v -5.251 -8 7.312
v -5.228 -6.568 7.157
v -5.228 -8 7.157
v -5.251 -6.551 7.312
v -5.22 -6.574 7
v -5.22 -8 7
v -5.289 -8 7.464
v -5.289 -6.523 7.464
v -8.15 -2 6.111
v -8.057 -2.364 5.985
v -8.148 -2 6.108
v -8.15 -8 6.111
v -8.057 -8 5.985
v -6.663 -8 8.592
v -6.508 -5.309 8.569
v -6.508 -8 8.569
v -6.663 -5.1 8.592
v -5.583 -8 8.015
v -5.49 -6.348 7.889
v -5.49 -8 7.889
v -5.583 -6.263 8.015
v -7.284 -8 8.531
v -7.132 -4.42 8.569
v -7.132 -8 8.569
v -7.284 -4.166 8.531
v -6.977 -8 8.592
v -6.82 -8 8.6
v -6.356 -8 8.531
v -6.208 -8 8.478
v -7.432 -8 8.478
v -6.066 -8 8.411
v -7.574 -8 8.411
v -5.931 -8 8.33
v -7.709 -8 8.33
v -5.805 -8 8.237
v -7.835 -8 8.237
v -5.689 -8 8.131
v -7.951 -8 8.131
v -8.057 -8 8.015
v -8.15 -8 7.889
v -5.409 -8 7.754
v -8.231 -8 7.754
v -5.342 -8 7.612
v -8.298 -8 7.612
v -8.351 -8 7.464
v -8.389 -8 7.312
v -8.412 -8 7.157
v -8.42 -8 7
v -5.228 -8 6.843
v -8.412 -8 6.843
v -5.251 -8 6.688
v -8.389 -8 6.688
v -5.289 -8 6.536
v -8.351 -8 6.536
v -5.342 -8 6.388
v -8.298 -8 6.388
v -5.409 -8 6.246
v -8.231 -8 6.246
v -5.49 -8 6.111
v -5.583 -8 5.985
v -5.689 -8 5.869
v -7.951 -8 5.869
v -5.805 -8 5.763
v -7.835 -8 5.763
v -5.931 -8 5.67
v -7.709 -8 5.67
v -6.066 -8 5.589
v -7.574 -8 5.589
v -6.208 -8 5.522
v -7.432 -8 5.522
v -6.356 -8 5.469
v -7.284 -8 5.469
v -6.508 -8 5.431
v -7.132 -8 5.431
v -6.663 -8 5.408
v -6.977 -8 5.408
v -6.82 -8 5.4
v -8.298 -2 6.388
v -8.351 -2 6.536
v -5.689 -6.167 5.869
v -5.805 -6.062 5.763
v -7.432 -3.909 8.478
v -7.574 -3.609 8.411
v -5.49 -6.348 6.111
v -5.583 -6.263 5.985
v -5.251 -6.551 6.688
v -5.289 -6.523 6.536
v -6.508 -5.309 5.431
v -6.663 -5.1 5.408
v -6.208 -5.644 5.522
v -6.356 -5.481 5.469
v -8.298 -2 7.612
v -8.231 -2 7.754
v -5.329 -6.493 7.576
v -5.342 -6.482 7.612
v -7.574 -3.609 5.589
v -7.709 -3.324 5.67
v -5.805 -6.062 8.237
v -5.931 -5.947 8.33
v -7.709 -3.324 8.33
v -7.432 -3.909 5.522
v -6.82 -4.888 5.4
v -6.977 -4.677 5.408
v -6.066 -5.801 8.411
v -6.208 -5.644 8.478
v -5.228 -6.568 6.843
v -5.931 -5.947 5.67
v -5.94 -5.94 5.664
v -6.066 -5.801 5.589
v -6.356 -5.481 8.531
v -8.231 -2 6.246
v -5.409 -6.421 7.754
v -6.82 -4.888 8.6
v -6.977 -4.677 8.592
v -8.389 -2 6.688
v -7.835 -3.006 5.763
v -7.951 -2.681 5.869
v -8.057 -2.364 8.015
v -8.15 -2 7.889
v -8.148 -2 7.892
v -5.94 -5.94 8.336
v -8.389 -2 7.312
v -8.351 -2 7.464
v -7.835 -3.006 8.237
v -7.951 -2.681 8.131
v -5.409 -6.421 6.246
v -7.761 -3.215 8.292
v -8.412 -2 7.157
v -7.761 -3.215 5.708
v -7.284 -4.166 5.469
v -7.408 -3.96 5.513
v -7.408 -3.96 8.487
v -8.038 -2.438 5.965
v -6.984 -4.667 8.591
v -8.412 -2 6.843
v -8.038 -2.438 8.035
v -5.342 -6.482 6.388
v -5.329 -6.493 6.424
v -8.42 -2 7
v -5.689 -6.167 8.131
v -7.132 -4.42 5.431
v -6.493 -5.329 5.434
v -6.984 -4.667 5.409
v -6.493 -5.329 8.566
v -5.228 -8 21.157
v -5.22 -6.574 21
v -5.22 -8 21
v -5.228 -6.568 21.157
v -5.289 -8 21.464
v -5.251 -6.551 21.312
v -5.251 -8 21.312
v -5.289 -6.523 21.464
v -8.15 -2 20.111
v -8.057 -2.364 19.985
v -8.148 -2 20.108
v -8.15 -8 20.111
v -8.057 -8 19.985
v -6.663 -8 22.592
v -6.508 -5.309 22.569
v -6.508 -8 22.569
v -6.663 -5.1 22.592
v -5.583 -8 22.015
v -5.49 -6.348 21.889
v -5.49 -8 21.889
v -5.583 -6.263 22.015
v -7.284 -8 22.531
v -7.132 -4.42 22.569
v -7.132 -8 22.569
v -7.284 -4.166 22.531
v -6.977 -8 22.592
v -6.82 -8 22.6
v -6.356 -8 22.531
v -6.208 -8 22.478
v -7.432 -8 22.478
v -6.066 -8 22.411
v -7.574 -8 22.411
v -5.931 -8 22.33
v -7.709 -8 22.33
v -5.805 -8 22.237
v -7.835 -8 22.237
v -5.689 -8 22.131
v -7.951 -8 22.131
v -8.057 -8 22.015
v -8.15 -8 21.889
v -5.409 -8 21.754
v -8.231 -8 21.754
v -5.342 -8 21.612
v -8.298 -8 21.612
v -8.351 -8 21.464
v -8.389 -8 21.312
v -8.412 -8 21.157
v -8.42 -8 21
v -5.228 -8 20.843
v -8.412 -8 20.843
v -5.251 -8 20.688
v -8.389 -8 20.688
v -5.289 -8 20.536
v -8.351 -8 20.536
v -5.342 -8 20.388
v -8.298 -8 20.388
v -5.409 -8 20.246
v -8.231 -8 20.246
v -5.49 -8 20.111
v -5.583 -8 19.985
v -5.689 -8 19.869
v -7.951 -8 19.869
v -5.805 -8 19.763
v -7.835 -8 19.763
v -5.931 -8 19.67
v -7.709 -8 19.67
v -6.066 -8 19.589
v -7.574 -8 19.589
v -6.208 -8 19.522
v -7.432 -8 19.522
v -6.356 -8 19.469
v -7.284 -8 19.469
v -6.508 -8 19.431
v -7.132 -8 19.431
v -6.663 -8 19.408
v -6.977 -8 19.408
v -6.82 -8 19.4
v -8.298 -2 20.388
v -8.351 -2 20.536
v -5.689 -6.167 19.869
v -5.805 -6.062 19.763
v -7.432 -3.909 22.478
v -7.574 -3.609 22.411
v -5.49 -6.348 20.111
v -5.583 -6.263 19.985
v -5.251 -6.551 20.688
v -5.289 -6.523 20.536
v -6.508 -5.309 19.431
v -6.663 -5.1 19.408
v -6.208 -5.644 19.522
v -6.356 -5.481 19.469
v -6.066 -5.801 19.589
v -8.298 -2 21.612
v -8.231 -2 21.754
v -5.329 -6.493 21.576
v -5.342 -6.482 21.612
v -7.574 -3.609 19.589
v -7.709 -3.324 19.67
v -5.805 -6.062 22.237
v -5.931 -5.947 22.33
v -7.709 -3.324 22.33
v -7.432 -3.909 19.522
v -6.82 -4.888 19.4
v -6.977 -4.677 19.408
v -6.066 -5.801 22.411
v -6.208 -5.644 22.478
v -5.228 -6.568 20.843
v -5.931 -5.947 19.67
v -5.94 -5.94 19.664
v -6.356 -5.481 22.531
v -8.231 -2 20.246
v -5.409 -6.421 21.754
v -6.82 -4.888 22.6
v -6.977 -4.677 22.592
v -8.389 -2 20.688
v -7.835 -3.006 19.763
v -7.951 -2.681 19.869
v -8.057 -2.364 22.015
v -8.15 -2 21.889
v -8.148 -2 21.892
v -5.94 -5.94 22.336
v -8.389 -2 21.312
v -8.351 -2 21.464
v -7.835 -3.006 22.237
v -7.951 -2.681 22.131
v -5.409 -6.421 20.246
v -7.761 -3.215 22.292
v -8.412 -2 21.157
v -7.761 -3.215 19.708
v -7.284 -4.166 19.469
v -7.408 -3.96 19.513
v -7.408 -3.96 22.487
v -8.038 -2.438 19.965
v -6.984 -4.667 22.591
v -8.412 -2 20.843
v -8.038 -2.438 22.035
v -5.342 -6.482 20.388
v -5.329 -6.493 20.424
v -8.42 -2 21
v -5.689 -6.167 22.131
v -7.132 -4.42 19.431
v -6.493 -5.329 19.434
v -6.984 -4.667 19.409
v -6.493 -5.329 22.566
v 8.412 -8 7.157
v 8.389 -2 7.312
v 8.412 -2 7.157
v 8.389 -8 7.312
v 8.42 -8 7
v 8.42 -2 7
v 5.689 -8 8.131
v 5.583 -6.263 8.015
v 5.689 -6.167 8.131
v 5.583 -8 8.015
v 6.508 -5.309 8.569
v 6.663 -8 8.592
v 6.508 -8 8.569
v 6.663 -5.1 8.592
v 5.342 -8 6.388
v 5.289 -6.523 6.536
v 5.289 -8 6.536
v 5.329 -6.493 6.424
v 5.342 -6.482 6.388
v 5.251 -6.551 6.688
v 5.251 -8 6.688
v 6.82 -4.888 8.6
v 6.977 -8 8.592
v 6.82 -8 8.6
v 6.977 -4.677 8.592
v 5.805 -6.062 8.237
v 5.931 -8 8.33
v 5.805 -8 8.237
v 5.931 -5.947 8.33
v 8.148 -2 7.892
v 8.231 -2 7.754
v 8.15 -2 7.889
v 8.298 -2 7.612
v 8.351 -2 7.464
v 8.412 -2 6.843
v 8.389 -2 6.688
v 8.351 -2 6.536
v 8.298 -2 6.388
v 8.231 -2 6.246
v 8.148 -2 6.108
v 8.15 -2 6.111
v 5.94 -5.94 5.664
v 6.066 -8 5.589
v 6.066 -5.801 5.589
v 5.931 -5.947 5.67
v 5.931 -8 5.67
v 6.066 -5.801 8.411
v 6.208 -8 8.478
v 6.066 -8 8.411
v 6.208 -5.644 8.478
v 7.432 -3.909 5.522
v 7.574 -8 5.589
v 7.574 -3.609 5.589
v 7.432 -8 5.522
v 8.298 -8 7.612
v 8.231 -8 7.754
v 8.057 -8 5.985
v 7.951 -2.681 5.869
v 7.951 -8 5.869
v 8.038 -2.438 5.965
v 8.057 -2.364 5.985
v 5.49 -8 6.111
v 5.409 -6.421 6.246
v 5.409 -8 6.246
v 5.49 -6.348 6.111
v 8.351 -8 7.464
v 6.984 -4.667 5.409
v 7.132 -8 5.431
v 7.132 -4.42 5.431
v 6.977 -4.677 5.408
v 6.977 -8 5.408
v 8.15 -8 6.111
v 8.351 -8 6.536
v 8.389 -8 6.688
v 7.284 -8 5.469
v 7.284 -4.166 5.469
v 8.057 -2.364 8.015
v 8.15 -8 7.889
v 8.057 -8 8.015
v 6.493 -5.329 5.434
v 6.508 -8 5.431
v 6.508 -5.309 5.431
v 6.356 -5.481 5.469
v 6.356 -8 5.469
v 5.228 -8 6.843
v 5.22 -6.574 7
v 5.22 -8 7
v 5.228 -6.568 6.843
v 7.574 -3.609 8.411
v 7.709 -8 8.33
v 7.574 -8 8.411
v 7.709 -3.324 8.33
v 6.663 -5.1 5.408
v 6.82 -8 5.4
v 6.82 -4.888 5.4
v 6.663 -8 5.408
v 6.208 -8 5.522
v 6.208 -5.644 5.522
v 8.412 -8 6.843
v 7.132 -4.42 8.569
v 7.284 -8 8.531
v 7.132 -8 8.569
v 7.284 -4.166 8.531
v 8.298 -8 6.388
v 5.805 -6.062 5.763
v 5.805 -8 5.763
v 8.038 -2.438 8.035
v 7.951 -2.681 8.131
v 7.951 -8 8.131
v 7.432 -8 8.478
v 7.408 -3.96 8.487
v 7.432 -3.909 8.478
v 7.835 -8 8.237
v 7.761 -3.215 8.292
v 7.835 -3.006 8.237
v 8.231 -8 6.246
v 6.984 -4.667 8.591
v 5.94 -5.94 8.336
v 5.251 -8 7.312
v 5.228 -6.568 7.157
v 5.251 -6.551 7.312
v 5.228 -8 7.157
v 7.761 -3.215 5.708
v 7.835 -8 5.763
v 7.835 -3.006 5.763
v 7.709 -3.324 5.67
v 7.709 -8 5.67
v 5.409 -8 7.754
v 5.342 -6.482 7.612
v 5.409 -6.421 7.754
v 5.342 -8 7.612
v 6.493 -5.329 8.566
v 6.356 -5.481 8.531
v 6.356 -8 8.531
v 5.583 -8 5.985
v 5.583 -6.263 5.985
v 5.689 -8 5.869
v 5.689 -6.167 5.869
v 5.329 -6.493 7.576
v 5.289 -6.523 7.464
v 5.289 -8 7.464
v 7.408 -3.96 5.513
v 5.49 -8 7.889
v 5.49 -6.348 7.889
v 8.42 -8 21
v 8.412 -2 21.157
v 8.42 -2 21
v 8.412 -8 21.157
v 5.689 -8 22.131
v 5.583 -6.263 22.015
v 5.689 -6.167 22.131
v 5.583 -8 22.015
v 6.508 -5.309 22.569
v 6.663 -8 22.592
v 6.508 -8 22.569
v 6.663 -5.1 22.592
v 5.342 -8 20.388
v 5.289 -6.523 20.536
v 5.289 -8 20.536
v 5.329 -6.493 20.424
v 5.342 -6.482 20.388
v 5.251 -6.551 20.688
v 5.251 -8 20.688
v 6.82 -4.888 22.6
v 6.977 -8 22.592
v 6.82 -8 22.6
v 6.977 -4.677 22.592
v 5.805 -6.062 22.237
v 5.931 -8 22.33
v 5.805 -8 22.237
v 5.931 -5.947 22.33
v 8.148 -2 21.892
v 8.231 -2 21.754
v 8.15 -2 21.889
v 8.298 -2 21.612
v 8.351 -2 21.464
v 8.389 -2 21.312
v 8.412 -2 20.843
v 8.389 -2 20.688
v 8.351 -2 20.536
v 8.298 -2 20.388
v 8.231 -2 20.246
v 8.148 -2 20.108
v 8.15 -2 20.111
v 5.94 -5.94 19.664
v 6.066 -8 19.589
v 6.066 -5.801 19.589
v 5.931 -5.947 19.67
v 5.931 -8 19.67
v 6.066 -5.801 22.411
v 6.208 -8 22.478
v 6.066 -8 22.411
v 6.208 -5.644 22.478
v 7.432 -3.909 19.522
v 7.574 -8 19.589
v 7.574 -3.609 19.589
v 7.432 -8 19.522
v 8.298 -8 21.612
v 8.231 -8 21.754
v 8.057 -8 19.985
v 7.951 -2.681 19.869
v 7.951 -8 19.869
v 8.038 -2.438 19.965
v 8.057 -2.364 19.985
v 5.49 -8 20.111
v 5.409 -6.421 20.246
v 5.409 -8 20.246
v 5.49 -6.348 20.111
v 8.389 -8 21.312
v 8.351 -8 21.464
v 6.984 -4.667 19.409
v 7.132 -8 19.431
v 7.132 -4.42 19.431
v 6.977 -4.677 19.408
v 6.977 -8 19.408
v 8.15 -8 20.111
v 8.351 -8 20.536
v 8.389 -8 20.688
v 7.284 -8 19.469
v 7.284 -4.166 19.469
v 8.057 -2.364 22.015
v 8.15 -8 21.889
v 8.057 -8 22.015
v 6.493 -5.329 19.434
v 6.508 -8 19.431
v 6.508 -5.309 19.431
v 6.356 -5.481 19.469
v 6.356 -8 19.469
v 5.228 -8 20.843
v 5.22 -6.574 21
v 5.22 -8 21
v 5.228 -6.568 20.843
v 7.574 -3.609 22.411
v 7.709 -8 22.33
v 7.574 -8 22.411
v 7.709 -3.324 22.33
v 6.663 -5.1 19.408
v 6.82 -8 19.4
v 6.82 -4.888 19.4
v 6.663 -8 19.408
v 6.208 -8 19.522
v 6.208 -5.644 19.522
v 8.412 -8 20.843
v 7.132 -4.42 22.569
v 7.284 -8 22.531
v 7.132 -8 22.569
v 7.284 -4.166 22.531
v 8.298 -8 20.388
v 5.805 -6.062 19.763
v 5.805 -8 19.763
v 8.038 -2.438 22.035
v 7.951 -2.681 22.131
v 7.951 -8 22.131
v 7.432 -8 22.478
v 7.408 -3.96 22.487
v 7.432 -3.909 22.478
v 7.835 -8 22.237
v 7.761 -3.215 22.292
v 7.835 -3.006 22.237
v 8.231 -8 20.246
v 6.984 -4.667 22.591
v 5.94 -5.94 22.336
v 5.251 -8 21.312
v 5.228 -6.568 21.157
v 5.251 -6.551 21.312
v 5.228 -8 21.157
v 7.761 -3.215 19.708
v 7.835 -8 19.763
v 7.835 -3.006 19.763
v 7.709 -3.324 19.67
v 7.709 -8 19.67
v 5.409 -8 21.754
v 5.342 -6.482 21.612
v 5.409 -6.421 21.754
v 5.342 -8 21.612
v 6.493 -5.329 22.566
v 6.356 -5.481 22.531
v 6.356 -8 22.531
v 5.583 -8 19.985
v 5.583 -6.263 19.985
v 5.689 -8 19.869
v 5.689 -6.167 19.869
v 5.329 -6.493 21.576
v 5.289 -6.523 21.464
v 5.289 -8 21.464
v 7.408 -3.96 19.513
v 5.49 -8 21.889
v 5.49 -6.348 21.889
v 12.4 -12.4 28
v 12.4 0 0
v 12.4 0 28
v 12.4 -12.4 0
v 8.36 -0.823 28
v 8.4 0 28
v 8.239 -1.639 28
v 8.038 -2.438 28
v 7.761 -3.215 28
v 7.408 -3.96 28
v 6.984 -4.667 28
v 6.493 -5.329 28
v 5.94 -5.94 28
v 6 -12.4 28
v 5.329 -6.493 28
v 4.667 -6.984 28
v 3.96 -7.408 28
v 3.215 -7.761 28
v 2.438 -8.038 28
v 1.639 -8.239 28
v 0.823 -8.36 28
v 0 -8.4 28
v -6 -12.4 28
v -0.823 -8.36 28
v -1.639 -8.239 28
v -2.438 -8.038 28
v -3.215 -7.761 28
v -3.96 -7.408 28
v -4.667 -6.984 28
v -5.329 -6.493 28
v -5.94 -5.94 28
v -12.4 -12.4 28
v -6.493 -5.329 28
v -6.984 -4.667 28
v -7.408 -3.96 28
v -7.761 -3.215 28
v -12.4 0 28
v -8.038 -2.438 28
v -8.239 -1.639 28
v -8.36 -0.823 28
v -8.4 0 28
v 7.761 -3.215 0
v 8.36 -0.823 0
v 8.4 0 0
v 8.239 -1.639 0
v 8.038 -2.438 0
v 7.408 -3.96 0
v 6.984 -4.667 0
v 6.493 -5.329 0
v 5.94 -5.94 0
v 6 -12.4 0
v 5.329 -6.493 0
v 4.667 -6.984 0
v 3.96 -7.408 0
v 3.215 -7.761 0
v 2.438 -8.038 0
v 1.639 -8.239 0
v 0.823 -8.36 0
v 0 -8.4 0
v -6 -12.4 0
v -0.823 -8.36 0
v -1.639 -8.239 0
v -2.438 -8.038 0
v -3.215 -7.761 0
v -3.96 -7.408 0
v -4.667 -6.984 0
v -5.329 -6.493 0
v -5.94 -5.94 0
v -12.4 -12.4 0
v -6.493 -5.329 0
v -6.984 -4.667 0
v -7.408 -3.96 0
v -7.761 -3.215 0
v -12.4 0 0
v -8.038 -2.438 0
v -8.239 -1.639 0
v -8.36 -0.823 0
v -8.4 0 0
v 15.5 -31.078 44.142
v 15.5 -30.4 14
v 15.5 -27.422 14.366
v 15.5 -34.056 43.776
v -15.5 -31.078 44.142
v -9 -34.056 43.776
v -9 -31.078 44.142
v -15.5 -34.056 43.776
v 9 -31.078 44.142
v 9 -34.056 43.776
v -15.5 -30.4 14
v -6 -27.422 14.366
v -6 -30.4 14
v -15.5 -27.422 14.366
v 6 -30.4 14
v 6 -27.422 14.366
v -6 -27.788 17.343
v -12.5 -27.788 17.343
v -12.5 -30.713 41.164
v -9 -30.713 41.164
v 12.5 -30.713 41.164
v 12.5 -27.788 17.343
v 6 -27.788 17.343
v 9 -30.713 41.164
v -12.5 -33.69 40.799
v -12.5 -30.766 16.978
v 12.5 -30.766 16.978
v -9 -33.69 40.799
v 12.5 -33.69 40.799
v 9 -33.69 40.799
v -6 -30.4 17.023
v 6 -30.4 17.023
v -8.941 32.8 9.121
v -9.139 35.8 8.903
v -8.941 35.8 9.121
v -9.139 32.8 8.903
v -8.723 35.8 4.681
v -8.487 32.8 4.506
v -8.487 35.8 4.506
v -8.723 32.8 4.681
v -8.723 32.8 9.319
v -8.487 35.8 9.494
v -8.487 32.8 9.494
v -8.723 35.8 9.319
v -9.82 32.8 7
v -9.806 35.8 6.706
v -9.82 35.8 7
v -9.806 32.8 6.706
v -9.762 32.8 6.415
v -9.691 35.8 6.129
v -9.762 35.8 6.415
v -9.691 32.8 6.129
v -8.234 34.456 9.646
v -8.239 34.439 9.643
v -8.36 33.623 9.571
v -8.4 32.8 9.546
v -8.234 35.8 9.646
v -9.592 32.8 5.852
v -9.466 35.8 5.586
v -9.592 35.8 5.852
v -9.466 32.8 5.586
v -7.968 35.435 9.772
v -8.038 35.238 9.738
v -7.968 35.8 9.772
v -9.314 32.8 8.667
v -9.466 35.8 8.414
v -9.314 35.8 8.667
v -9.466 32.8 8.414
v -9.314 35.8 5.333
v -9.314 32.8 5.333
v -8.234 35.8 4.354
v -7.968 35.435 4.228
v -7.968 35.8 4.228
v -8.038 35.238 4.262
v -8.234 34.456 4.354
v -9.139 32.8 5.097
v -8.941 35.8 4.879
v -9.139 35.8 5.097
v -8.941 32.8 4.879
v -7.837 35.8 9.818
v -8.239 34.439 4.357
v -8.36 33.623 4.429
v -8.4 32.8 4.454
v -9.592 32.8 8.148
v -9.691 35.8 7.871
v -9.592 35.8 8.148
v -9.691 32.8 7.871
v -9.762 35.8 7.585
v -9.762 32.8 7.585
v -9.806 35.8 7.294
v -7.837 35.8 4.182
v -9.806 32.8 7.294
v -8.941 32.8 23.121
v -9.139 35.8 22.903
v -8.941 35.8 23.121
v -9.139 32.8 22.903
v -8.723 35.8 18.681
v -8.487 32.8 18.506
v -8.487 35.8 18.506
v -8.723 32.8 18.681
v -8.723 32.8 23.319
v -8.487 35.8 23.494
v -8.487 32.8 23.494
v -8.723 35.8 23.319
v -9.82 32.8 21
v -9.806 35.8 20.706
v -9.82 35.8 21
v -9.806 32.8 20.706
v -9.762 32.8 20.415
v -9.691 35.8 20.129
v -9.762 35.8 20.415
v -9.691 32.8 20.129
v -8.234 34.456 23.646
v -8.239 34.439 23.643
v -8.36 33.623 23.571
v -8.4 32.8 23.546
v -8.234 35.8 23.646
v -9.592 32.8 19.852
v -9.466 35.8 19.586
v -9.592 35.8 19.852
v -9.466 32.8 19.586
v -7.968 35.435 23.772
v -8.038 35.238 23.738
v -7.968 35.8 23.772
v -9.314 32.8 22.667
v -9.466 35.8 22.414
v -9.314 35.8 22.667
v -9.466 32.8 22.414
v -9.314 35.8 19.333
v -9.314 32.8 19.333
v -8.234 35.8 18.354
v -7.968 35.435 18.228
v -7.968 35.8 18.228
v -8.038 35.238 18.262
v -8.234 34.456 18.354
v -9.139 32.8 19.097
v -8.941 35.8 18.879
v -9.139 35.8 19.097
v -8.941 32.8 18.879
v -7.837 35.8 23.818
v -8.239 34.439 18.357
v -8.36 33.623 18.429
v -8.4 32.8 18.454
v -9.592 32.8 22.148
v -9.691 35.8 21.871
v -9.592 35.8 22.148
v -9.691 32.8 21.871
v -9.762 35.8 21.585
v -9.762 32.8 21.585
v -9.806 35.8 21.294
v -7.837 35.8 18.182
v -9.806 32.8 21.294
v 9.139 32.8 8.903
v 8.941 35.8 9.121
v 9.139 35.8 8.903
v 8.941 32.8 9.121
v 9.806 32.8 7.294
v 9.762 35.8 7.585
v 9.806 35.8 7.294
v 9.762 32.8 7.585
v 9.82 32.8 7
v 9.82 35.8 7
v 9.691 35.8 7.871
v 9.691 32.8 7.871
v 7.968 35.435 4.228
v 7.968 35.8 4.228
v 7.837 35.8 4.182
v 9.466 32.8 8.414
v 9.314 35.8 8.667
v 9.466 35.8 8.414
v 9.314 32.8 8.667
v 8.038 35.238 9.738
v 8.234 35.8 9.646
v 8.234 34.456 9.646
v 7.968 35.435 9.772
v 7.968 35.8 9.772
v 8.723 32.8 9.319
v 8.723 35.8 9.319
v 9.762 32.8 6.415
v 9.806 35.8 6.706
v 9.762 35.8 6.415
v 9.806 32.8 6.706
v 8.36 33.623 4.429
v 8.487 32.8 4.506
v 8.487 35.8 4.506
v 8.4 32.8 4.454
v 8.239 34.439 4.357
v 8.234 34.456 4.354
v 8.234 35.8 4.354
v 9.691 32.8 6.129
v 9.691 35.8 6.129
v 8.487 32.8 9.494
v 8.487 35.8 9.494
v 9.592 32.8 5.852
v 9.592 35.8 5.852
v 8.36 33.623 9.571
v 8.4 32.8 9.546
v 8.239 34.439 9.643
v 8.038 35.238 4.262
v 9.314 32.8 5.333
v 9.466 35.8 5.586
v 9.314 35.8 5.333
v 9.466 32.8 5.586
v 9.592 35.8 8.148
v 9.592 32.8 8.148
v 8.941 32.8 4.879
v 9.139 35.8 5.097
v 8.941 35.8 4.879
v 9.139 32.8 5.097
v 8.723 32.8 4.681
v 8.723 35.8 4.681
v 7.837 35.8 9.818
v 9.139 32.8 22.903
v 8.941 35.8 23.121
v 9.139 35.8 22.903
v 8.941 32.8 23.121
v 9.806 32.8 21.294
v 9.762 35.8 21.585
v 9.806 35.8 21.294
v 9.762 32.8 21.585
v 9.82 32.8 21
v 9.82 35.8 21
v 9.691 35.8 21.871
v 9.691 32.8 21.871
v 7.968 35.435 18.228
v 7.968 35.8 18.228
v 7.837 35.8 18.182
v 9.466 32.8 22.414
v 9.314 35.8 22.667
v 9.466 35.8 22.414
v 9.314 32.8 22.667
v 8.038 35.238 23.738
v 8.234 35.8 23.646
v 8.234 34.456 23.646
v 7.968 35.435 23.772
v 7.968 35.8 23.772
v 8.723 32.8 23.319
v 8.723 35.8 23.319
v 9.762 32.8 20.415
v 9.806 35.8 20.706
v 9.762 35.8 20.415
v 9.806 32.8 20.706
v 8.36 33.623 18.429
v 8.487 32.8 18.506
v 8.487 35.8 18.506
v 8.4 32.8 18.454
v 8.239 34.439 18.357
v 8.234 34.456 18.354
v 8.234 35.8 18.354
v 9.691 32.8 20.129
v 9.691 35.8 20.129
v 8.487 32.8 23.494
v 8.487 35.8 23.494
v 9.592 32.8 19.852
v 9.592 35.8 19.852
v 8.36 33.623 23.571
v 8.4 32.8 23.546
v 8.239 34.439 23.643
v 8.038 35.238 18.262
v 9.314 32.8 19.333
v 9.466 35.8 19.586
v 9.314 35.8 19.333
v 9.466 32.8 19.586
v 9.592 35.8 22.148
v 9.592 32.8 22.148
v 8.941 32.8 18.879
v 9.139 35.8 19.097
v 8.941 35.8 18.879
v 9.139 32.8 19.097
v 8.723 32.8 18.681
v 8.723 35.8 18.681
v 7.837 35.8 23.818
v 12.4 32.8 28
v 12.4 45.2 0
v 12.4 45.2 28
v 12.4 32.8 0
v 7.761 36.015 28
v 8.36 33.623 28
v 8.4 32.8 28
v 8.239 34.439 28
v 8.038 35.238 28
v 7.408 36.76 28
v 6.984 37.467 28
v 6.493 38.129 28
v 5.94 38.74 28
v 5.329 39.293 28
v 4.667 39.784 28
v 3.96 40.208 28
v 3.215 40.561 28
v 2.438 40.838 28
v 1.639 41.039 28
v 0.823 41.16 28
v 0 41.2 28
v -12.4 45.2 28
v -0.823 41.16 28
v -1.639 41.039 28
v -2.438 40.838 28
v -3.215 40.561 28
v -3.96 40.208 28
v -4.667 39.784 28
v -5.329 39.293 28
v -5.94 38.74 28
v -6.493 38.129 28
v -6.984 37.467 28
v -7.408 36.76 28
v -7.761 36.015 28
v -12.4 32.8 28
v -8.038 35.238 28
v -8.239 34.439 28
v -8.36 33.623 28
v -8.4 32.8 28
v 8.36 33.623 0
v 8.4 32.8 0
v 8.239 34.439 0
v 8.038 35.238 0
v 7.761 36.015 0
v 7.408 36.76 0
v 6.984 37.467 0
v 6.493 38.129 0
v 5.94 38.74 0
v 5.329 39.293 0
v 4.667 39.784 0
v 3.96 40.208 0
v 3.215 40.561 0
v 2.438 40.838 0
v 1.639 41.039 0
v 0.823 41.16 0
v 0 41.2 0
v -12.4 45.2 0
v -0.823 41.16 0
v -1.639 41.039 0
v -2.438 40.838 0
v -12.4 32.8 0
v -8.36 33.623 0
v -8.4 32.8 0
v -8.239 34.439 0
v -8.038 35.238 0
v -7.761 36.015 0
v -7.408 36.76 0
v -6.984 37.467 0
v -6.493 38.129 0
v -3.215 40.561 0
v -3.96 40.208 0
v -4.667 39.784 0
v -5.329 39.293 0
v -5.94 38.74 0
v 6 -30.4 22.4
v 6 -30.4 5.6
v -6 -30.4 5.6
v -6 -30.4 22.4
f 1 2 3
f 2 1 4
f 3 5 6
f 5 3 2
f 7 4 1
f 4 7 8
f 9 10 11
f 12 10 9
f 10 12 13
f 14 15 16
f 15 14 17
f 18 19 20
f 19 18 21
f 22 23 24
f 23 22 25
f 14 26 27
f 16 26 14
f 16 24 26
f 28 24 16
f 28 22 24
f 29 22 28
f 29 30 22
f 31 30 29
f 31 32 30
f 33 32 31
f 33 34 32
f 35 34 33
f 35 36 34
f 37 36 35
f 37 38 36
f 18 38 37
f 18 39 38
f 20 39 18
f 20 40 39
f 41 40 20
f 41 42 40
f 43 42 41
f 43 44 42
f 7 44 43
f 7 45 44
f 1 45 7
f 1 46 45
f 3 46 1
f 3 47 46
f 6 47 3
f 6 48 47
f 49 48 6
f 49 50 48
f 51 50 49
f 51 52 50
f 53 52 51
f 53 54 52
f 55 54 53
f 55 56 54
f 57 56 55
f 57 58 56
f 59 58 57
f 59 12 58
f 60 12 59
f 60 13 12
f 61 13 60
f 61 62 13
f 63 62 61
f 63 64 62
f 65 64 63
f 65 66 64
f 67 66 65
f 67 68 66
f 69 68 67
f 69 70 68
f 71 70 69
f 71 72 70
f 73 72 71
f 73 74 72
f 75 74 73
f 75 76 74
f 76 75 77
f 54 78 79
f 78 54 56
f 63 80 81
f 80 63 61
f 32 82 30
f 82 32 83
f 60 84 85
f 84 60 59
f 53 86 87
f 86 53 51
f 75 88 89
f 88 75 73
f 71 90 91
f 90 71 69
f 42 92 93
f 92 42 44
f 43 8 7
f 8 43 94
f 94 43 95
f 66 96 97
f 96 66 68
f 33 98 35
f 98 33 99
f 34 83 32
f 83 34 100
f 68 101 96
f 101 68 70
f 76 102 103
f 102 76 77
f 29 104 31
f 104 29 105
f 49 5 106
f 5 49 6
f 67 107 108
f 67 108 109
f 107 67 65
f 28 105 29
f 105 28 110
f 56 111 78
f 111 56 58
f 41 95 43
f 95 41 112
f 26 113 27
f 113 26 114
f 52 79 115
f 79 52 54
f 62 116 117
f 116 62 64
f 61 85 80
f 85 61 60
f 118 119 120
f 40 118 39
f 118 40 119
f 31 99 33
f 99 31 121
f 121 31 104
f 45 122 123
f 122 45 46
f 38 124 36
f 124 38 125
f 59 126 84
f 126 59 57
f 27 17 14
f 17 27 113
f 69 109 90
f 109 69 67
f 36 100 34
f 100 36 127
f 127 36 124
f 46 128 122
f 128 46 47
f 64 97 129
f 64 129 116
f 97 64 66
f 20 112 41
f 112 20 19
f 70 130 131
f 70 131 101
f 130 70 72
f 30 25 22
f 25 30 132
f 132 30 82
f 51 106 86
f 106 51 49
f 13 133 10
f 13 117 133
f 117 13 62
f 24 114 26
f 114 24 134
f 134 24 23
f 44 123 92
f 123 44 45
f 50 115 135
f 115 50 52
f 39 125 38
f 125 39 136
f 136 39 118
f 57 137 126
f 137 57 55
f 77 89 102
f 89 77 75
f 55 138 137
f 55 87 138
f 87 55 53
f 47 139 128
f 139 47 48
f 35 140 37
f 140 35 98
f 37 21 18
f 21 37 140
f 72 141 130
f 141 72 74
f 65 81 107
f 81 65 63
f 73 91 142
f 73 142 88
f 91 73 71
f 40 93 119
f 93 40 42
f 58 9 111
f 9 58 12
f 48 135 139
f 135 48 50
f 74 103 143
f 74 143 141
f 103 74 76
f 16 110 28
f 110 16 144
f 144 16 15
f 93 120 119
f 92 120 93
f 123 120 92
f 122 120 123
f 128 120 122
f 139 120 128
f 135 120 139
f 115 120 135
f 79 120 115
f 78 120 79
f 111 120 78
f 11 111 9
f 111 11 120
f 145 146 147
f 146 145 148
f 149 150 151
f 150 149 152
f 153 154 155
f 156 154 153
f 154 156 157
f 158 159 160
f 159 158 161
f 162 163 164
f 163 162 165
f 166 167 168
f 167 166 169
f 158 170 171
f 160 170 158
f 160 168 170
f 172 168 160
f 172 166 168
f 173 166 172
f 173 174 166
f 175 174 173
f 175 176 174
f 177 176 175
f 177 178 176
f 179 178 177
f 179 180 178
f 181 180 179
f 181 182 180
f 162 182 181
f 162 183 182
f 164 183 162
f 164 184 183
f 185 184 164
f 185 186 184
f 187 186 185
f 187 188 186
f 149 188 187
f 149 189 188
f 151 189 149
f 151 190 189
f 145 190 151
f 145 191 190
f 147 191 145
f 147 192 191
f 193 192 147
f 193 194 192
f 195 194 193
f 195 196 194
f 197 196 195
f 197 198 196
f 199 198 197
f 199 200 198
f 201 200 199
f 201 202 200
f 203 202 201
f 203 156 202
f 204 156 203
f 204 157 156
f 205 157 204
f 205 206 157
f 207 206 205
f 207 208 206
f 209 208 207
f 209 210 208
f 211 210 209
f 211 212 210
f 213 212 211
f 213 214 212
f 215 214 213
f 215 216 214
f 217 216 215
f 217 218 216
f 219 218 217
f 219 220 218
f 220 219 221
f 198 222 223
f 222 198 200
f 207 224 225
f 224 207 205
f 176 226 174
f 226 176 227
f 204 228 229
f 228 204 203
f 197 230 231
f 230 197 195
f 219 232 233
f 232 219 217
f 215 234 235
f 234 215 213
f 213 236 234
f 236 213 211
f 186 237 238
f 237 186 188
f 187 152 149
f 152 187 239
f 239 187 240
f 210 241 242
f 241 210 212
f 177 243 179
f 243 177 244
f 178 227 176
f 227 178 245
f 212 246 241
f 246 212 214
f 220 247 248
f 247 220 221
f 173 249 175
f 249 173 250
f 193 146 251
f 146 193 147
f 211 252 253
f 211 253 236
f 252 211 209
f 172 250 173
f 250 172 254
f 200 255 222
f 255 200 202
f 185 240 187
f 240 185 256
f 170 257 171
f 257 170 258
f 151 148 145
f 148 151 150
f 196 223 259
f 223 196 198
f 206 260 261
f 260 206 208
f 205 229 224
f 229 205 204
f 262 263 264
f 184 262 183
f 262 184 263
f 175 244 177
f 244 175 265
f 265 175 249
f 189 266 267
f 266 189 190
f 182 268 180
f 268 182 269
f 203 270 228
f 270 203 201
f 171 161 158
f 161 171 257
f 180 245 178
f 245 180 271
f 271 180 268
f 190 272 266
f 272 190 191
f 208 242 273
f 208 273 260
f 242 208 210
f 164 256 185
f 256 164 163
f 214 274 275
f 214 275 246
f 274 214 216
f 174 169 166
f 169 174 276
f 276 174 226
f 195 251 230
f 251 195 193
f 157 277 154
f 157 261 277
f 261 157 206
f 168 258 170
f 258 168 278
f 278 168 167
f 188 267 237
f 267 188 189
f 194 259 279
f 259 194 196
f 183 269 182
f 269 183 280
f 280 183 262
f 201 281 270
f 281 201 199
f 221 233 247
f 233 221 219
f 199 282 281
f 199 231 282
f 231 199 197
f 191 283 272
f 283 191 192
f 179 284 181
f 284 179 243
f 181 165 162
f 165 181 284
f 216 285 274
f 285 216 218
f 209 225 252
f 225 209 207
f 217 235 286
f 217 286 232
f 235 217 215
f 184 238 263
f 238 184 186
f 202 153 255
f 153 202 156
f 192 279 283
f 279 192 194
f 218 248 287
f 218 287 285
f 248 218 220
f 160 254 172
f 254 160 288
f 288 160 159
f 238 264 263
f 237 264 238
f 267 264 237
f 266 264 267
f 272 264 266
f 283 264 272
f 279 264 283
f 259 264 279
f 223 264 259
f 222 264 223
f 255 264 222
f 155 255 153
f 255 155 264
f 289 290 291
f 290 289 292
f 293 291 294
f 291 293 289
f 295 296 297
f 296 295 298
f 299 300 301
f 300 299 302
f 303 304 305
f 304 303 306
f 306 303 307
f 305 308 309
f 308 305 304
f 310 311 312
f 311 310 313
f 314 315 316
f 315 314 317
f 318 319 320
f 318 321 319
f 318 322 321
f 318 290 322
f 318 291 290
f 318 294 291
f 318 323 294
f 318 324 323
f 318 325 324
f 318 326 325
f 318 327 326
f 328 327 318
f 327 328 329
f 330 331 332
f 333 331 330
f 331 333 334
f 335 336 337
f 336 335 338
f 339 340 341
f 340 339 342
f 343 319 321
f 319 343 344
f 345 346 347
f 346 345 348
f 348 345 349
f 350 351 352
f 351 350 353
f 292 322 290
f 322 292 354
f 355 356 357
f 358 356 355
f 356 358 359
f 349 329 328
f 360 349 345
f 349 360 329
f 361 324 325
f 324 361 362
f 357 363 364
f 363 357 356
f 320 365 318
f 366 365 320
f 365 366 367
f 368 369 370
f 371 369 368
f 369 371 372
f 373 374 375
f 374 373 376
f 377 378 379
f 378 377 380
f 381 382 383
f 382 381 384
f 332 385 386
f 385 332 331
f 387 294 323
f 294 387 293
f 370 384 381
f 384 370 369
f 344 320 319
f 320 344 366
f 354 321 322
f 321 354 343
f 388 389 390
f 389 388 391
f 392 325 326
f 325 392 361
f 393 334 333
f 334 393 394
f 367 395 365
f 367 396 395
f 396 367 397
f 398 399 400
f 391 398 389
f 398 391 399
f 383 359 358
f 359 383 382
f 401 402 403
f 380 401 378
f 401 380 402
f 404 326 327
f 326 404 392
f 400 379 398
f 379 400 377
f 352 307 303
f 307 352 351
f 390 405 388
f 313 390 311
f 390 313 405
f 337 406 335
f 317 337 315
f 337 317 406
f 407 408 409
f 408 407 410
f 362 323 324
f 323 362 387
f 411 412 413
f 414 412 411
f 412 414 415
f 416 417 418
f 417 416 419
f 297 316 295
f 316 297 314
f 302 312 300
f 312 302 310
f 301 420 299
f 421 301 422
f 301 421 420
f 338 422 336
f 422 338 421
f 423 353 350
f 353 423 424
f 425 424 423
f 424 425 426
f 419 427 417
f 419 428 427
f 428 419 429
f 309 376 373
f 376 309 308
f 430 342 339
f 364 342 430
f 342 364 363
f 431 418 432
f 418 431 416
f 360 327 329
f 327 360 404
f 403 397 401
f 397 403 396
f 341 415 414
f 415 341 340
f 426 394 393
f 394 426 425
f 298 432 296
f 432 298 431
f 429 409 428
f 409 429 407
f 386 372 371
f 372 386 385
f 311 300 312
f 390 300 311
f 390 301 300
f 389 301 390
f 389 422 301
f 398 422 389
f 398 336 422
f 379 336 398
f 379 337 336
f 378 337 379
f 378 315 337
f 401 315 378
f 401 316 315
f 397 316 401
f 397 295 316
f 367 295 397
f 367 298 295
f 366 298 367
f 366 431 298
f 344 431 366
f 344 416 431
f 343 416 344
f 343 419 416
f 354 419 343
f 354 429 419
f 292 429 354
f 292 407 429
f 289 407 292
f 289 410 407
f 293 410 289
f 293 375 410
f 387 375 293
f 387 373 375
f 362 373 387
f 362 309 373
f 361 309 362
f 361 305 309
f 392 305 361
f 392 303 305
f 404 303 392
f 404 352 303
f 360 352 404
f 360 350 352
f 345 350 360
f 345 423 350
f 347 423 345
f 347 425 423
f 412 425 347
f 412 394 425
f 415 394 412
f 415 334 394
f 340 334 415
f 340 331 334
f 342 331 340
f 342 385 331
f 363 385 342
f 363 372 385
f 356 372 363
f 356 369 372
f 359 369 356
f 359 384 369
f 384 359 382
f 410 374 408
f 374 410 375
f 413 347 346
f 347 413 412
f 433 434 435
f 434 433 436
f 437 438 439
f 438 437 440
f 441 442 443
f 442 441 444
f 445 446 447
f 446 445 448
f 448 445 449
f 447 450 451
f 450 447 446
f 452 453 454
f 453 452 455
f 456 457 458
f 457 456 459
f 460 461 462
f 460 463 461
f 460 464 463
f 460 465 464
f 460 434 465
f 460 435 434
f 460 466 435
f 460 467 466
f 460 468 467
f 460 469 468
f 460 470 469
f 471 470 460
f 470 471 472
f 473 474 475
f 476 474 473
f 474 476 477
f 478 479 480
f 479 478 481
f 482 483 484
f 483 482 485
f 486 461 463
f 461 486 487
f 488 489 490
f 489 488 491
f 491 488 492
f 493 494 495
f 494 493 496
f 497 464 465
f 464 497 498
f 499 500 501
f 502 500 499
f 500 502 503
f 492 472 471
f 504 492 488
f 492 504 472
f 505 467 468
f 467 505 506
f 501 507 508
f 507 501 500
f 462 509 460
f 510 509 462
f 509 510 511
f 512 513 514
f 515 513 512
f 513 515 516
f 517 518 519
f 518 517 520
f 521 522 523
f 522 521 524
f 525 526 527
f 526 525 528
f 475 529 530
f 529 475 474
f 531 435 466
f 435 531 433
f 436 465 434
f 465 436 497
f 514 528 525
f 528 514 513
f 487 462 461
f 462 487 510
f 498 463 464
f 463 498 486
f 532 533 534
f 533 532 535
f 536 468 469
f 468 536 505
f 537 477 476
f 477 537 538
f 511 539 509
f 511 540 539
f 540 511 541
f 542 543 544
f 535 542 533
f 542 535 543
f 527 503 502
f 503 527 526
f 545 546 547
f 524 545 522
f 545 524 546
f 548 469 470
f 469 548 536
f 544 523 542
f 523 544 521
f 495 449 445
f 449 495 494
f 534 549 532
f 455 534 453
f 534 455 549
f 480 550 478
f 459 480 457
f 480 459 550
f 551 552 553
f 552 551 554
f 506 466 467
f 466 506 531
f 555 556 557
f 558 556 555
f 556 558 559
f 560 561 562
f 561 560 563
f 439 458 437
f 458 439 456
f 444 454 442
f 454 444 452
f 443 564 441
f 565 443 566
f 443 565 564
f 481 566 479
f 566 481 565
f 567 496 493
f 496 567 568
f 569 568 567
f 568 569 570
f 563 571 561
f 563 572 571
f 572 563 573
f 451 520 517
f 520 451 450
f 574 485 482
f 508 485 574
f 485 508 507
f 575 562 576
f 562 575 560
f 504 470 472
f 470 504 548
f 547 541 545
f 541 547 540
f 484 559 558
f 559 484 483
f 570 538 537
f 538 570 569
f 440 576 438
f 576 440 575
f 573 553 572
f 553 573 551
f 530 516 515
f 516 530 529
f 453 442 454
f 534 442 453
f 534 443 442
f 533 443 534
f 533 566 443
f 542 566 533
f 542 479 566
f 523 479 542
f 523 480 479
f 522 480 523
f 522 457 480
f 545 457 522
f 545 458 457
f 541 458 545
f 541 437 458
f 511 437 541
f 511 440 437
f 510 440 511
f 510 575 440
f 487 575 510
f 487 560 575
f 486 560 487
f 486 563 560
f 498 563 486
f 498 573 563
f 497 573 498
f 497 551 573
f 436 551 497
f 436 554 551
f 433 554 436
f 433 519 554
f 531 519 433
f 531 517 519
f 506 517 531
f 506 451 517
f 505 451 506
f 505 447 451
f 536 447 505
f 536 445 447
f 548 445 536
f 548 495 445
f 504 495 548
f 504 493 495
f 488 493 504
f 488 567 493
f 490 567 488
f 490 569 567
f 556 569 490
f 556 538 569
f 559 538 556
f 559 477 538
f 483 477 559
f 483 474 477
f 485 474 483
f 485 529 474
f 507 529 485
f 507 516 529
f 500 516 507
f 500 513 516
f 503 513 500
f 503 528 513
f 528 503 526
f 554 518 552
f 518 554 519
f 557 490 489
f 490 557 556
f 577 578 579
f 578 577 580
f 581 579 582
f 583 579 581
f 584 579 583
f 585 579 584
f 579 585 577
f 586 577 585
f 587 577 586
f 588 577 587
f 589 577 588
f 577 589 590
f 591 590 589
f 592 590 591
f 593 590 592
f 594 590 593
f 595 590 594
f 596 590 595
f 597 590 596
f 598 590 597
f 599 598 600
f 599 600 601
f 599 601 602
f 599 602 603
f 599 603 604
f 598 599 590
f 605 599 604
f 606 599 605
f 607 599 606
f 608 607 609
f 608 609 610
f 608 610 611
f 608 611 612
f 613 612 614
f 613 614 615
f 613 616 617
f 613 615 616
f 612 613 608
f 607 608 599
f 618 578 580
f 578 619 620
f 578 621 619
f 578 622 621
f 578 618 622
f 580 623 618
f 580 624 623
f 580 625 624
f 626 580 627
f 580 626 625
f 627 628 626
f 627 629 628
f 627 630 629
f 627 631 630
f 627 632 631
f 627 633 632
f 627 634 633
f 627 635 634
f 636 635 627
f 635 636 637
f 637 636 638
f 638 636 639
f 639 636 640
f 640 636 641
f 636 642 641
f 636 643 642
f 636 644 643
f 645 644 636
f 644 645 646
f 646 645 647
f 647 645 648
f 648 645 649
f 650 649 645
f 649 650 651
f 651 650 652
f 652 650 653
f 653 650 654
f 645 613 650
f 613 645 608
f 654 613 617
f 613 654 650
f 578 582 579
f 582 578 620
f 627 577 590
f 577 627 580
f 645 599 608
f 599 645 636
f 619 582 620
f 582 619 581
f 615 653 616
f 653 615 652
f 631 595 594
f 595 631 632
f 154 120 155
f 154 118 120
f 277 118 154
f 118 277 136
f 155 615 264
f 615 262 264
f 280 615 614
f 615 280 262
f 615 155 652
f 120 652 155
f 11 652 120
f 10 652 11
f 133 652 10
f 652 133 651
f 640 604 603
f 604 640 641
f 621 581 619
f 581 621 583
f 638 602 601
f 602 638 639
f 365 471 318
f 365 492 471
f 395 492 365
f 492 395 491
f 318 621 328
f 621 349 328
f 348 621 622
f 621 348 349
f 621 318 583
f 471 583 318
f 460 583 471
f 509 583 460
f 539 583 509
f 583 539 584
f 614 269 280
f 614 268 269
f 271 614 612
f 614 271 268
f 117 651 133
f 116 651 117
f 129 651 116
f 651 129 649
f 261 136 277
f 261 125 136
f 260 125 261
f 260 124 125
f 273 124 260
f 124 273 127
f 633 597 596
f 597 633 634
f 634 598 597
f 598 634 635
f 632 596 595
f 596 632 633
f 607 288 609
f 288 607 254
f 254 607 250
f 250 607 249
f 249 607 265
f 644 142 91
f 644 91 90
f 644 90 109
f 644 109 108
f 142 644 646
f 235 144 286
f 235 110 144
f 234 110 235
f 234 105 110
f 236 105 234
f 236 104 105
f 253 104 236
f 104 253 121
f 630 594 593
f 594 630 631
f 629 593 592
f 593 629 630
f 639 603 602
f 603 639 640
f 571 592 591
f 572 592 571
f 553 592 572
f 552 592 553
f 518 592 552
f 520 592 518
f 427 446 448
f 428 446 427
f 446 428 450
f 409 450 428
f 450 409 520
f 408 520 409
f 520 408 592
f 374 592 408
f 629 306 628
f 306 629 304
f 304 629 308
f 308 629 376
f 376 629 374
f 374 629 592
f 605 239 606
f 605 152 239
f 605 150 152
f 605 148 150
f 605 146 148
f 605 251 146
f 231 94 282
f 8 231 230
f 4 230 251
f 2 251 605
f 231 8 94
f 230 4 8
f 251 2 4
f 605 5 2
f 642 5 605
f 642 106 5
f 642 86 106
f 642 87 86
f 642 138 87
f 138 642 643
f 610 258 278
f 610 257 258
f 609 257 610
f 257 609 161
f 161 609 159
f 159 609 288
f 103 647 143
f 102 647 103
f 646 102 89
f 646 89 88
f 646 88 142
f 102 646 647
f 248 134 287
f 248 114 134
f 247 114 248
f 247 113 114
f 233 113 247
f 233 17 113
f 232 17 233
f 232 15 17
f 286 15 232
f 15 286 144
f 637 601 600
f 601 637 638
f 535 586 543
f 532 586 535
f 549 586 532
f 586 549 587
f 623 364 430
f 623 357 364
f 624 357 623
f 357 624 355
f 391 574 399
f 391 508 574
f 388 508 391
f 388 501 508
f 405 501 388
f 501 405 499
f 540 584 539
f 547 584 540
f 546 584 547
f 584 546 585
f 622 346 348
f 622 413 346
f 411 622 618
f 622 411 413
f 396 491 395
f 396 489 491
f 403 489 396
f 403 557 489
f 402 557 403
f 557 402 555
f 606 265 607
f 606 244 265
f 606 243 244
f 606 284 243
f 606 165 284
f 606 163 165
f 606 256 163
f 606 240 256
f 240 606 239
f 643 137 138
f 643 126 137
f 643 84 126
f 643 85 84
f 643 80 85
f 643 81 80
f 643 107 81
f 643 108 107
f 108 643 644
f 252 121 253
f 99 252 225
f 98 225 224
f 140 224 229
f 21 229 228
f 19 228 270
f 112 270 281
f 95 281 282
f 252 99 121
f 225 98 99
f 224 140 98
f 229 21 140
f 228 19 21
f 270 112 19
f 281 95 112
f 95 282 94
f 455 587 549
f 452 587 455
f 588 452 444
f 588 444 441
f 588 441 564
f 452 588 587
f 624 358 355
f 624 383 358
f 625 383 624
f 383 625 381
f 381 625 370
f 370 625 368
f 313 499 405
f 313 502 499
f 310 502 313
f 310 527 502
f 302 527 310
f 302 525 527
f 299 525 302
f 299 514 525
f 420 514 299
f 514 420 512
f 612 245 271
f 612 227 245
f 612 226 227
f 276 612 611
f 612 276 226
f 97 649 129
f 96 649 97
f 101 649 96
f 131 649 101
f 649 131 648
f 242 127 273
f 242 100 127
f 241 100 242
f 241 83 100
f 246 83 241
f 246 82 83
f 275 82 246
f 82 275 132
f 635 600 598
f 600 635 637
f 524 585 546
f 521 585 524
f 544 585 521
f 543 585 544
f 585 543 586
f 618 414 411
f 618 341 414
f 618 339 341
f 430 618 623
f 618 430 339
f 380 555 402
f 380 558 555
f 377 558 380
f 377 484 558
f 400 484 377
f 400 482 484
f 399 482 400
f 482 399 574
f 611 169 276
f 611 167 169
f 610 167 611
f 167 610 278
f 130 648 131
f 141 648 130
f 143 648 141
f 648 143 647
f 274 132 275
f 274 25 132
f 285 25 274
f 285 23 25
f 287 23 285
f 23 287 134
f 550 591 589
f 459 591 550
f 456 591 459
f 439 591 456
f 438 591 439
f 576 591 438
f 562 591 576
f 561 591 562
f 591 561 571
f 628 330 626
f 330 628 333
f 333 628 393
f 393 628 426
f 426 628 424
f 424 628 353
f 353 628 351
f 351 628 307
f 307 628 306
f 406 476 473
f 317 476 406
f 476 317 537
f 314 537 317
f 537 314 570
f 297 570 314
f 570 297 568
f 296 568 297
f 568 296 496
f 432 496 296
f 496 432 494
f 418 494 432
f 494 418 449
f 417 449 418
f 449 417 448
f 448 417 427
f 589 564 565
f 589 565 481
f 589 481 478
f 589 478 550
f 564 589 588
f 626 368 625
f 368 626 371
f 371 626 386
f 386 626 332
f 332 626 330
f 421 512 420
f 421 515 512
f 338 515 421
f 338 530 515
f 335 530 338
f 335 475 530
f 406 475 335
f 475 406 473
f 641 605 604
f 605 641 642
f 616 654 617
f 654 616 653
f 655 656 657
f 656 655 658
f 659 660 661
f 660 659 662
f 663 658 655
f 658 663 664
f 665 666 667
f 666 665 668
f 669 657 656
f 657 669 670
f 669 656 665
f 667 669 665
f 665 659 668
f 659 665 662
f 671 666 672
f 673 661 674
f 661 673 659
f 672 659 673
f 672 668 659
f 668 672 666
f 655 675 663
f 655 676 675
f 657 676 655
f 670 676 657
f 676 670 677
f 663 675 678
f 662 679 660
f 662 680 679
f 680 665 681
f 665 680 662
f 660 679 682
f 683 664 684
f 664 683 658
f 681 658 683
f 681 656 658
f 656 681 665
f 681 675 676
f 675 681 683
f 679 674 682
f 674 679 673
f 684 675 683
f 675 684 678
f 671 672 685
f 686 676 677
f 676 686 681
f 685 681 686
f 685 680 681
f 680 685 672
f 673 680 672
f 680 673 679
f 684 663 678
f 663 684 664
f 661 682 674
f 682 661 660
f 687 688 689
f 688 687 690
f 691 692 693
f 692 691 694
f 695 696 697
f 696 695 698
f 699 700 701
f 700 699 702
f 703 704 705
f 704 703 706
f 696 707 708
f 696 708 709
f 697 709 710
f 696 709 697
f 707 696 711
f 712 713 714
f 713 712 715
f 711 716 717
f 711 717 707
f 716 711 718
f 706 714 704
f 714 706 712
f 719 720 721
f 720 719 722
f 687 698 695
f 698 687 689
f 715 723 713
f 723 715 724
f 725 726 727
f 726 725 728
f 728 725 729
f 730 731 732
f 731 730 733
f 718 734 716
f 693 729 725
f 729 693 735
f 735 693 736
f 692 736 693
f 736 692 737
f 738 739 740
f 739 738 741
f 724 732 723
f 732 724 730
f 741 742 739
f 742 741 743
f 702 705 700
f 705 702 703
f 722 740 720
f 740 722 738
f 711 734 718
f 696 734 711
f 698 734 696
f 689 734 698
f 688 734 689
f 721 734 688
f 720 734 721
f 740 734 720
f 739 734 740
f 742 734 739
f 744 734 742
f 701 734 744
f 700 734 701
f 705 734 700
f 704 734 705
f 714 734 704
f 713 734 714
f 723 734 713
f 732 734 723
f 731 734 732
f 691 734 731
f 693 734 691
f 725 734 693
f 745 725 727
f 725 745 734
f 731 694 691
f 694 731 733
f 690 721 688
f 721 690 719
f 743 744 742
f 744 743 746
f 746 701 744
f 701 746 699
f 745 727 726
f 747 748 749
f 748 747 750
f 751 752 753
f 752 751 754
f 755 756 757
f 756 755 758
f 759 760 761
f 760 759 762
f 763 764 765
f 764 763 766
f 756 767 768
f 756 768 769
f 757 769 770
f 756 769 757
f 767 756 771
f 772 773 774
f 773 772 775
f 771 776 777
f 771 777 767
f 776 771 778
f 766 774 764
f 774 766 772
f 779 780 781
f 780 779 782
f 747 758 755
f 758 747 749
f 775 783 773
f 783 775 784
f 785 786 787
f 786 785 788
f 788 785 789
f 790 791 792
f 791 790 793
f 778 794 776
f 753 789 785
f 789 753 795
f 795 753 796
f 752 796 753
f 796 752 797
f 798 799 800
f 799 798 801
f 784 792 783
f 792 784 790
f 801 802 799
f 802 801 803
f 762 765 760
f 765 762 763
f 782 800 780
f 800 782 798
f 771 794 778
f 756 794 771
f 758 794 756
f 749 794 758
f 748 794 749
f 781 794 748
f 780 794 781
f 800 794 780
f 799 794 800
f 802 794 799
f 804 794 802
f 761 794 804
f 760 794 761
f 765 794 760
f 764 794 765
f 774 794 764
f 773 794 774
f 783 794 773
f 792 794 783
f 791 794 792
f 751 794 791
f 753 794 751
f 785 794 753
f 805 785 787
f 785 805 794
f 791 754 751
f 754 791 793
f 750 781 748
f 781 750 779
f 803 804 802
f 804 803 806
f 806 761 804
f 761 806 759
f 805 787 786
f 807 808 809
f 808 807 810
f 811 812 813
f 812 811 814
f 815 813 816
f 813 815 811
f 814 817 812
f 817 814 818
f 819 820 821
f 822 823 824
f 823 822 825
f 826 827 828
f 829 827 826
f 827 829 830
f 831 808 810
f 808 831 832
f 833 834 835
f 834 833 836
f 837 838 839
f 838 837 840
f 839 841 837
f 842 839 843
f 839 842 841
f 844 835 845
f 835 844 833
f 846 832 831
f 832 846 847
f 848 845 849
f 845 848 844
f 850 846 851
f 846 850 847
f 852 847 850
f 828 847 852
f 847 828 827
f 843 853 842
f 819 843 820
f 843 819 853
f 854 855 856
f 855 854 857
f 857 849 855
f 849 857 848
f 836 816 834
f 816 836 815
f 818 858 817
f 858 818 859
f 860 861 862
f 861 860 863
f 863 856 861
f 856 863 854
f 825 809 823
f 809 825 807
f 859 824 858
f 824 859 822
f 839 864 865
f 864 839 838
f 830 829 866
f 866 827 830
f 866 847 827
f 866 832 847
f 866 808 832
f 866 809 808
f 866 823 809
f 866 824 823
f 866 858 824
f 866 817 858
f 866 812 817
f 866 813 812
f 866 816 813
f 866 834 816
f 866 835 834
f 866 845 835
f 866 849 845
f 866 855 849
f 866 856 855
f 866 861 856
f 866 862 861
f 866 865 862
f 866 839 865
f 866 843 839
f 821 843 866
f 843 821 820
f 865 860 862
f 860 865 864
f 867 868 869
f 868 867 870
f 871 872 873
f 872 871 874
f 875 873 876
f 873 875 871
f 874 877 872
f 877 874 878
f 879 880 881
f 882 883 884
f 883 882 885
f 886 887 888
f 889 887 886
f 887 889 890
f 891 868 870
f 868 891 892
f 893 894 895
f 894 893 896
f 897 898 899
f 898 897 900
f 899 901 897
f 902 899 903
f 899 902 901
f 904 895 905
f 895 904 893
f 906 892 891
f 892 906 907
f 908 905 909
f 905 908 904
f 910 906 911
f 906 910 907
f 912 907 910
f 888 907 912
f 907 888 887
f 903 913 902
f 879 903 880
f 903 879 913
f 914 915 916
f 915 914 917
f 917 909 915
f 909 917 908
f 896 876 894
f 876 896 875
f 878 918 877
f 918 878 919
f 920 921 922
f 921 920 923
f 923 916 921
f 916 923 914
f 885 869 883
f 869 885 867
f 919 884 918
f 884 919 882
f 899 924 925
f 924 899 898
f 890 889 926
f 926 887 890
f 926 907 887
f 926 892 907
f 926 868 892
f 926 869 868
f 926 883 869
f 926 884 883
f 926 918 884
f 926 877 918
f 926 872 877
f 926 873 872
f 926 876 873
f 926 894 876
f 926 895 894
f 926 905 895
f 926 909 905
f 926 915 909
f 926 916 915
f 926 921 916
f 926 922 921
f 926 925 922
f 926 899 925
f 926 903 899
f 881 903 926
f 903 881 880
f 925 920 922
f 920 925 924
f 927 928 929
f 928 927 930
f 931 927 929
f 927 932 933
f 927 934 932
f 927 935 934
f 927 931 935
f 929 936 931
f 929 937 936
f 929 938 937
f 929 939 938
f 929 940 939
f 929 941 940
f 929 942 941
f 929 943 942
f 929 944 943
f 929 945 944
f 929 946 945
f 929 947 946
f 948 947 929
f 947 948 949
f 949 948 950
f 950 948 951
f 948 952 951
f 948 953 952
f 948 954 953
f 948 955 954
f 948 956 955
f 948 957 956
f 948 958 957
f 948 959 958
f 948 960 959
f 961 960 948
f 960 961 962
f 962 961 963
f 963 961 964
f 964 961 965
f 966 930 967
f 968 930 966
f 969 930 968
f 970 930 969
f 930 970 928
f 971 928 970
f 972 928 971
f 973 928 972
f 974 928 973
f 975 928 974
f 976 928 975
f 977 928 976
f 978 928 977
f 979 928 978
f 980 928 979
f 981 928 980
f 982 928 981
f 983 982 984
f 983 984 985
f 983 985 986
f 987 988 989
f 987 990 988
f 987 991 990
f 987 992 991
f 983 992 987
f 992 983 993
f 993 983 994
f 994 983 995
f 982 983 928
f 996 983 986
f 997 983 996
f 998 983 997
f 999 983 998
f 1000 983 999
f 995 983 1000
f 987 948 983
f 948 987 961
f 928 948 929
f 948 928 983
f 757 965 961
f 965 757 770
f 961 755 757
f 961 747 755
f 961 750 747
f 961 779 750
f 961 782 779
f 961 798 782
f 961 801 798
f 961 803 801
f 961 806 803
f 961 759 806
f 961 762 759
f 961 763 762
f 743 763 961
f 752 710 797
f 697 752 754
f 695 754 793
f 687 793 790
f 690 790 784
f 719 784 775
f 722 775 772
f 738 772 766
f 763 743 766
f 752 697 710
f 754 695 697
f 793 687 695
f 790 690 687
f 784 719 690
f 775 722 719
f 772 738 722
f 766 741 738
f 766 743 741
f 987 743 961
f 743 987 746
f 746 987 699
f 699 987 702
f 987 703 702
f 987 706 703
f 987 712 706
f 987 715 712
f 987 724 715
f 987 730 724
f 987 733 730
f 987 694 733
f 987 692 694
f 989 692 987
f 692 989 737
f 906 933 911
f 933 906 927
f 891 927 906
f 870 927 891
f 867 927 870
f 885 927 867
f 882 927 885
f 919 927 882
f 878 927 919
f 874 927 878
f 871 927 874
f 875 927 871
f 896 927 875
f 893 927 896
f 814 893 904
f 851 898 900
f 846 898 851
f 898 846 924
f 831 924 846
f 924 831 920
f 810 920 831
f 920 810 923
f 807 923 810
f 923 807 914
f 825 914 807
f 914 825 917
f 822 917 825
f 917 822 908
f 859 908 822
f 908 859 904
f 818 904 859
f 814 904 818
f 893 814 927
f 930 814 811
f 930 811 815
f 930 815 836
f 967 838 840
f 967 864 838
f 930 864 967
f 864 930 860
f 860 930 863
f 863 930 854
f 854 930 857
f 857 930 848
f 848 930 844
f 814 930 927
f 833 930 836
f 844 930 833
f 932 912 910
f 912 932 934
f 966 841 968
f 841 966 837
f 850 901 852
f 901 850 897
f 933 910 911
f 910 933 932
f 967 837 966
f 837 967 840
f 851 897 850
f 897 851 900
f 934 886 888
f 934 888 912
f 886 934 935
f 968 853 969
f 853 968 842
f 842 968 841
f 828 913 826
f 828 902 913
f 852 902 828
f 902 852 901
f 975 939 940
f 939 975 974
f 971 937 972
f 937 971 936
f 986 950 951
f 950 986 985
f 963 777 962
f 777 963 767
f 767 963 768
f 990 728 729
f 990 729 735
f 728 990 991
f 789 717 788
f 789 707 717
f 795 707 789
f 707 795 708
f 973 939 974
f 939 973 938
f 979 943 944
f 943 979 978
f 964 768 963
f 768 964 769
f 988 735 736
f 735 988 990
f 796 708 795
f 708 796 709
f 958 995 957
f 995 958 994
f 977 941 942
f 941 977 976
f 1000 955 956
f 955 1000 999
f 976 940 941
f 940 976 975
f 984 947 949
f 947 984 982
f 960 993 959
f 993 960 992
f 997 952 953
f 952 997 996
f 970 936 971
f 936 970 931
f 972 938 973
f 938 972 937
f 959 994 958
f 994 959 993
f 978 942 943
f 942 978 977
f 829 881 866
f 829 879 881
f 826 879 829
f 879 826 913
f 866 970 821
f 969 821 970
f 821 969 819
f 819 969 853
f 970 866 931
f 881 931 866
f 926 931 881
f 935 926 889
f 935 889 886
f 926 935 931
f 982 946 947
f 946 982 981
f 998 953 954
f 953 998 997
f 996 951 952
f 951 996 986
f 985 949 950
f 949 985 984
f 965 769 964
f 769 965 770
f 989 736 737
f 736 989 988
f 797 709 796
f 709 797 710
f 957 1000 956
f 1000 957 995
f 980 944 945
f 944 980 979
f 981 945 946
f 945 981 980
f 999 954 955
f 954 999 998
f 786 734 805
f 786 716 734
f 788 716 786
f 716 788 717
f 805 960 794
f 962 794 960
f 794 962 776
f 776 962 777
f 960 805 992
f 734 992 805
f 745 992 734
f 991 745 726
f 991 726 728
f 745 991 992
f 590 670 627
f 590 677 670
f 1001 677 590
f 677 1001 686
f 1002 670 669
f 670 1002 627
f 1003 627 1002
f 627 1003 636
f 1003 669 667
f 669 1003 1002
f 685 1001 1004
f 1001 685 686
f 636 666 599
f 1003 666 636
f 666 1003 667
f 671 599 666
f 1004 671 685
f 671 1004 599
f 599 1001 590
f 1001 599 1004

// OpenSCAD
// ============================================================
//  THE AVIATOR — Forward Camera Mount
//  Clamps to Tarot FY690S front arm (16mm OD tube)
//  Pi Camera v2 faces forward at 7 degrees downward tilt
//  Print in PETG, 60% infill, 0.2mm layer height
// ============================================================

ARM_OD        = 16.0;
ARM_CLAMP_GAP = 0.4;
CLAMP_W       = 28;
CLAMP_WALL    = 4;
BOLT_D        = 3.2;
BOLT_HEAD_D   = 6.0;
CAM_W         = 25;
CAM_H         = 24;
CAM_MOUNT_SEP = 21;
CAM_HOLE_D    = 2.0;
CAM_PLATE_T   = 3.0;
TILT_DEG      = 7;
RIBBON_SLOT_W = 18;
RIBBON_SLOT_T = 2.0;
$fn           = 64;

module clamp_lower() {
    r = ARM_OD/2 + ARM_CLAMP_GAP + CLAMP_WALL;
    difference() {
        translate([-r, -r, 0]) cube([r*2, r, CLAMP_W]);
        translate([0, 0, -1]) cylinder(r=ARM_OD/2 + ARM_CLAMP_GAP, h=CLAMP_W+2);
        for (x=[-r*0.55, r*0.55])
        for (z=[CLAMP_W*0.25, CLAMP_W*0.75]) {
            translate([x, -CLAMP_WALL/2, z])
                rotate([90,0,0]) cylinder(d=BOLT_D, h=CLAMP_WALL+2);
        }
    }
}

module clamp_upper() {
    r = ARM_OD/2 + ARM_CLAMP_GAP + CLAMP_WALL;
    difference() {
        translate([-r, 0, 0]) cube([r*2, r, CLAMP_W]);
        translate([0, 0, -1]) cylinder(r=ARM_OD/2 + ARM_CLAMP_GAP, h=CLAMP_W+2);
        for (x=[-r*0.55, r*0.55])
        for (z=[CLAMP_W*0.25, CLAMP_W*0.75]) {
            translate([x, CLAMP_WALL/2, z])
                rotate([90,0,0]) {
                    cylinder(d=BOLT_D, h=CLAMP_WALL+2);
                    translate([0,0,-1]) cylinder(d=BOLT_HEAD_D, h=CLAMP_WALL*0.6+1);
                }
        }
    }
}

module camera_plate() {
    difference() {
        translate([-CAM_W/2 - 3, 0, 0])
            cube([CAM_W + 6, CAM_PLATE_T, CAM_H + 6]);
        translate([-CAM_W/2, -1, 3])
            cube([CAM_W, CAM_PLATE_T+2, CAM_H]);
        for (x=[-CAM_MOUNT_SEP/2, CAM_MOUNT_SEP/2])
            translate([x, -1, CAM_H/2 + 3])
                rotate([-90,0,0]) cylinder(d=CAM_HOLE_D, h=CAM_PLATE_T+2);
        translate([-RIBBON_SLOT_W/2, -1, CAM_H + 3])
            cube([RIBBON_SLOT_W, CAM_PLATE_T+2, 4]);
    }
}

module neck() {
    r = ARM_OD/2 + ARM_CLAMP_GAP + CLAMP_WALL;
    hull() {
        translate([-6, -r, 0]) cube([12, 1, CLAMP_W]);
        translate([-6, -r - 18, CLAMP_W*0.2])
            cube([12, 1, CLAMP_W*0.6]);
    }
}

// Lower clamp
clamp_lower();
// Neck
neck();
// Camera plate (tilted)
translate([0, -(ARM_OD/2 + ARM_CLAMP_GAP + CLAMP_WALL + 18), CLAMP_W/2])
    rotate([TILT_DEG, 0, 0])
        camera_plate();

// Upper clamp (shown offset for printing — print separately)
translate([0, ARM_OD + ARM_CLAMP_GAP*2 + CLAMP_WALL*2 + 8, 0])
    clamp_upper();
